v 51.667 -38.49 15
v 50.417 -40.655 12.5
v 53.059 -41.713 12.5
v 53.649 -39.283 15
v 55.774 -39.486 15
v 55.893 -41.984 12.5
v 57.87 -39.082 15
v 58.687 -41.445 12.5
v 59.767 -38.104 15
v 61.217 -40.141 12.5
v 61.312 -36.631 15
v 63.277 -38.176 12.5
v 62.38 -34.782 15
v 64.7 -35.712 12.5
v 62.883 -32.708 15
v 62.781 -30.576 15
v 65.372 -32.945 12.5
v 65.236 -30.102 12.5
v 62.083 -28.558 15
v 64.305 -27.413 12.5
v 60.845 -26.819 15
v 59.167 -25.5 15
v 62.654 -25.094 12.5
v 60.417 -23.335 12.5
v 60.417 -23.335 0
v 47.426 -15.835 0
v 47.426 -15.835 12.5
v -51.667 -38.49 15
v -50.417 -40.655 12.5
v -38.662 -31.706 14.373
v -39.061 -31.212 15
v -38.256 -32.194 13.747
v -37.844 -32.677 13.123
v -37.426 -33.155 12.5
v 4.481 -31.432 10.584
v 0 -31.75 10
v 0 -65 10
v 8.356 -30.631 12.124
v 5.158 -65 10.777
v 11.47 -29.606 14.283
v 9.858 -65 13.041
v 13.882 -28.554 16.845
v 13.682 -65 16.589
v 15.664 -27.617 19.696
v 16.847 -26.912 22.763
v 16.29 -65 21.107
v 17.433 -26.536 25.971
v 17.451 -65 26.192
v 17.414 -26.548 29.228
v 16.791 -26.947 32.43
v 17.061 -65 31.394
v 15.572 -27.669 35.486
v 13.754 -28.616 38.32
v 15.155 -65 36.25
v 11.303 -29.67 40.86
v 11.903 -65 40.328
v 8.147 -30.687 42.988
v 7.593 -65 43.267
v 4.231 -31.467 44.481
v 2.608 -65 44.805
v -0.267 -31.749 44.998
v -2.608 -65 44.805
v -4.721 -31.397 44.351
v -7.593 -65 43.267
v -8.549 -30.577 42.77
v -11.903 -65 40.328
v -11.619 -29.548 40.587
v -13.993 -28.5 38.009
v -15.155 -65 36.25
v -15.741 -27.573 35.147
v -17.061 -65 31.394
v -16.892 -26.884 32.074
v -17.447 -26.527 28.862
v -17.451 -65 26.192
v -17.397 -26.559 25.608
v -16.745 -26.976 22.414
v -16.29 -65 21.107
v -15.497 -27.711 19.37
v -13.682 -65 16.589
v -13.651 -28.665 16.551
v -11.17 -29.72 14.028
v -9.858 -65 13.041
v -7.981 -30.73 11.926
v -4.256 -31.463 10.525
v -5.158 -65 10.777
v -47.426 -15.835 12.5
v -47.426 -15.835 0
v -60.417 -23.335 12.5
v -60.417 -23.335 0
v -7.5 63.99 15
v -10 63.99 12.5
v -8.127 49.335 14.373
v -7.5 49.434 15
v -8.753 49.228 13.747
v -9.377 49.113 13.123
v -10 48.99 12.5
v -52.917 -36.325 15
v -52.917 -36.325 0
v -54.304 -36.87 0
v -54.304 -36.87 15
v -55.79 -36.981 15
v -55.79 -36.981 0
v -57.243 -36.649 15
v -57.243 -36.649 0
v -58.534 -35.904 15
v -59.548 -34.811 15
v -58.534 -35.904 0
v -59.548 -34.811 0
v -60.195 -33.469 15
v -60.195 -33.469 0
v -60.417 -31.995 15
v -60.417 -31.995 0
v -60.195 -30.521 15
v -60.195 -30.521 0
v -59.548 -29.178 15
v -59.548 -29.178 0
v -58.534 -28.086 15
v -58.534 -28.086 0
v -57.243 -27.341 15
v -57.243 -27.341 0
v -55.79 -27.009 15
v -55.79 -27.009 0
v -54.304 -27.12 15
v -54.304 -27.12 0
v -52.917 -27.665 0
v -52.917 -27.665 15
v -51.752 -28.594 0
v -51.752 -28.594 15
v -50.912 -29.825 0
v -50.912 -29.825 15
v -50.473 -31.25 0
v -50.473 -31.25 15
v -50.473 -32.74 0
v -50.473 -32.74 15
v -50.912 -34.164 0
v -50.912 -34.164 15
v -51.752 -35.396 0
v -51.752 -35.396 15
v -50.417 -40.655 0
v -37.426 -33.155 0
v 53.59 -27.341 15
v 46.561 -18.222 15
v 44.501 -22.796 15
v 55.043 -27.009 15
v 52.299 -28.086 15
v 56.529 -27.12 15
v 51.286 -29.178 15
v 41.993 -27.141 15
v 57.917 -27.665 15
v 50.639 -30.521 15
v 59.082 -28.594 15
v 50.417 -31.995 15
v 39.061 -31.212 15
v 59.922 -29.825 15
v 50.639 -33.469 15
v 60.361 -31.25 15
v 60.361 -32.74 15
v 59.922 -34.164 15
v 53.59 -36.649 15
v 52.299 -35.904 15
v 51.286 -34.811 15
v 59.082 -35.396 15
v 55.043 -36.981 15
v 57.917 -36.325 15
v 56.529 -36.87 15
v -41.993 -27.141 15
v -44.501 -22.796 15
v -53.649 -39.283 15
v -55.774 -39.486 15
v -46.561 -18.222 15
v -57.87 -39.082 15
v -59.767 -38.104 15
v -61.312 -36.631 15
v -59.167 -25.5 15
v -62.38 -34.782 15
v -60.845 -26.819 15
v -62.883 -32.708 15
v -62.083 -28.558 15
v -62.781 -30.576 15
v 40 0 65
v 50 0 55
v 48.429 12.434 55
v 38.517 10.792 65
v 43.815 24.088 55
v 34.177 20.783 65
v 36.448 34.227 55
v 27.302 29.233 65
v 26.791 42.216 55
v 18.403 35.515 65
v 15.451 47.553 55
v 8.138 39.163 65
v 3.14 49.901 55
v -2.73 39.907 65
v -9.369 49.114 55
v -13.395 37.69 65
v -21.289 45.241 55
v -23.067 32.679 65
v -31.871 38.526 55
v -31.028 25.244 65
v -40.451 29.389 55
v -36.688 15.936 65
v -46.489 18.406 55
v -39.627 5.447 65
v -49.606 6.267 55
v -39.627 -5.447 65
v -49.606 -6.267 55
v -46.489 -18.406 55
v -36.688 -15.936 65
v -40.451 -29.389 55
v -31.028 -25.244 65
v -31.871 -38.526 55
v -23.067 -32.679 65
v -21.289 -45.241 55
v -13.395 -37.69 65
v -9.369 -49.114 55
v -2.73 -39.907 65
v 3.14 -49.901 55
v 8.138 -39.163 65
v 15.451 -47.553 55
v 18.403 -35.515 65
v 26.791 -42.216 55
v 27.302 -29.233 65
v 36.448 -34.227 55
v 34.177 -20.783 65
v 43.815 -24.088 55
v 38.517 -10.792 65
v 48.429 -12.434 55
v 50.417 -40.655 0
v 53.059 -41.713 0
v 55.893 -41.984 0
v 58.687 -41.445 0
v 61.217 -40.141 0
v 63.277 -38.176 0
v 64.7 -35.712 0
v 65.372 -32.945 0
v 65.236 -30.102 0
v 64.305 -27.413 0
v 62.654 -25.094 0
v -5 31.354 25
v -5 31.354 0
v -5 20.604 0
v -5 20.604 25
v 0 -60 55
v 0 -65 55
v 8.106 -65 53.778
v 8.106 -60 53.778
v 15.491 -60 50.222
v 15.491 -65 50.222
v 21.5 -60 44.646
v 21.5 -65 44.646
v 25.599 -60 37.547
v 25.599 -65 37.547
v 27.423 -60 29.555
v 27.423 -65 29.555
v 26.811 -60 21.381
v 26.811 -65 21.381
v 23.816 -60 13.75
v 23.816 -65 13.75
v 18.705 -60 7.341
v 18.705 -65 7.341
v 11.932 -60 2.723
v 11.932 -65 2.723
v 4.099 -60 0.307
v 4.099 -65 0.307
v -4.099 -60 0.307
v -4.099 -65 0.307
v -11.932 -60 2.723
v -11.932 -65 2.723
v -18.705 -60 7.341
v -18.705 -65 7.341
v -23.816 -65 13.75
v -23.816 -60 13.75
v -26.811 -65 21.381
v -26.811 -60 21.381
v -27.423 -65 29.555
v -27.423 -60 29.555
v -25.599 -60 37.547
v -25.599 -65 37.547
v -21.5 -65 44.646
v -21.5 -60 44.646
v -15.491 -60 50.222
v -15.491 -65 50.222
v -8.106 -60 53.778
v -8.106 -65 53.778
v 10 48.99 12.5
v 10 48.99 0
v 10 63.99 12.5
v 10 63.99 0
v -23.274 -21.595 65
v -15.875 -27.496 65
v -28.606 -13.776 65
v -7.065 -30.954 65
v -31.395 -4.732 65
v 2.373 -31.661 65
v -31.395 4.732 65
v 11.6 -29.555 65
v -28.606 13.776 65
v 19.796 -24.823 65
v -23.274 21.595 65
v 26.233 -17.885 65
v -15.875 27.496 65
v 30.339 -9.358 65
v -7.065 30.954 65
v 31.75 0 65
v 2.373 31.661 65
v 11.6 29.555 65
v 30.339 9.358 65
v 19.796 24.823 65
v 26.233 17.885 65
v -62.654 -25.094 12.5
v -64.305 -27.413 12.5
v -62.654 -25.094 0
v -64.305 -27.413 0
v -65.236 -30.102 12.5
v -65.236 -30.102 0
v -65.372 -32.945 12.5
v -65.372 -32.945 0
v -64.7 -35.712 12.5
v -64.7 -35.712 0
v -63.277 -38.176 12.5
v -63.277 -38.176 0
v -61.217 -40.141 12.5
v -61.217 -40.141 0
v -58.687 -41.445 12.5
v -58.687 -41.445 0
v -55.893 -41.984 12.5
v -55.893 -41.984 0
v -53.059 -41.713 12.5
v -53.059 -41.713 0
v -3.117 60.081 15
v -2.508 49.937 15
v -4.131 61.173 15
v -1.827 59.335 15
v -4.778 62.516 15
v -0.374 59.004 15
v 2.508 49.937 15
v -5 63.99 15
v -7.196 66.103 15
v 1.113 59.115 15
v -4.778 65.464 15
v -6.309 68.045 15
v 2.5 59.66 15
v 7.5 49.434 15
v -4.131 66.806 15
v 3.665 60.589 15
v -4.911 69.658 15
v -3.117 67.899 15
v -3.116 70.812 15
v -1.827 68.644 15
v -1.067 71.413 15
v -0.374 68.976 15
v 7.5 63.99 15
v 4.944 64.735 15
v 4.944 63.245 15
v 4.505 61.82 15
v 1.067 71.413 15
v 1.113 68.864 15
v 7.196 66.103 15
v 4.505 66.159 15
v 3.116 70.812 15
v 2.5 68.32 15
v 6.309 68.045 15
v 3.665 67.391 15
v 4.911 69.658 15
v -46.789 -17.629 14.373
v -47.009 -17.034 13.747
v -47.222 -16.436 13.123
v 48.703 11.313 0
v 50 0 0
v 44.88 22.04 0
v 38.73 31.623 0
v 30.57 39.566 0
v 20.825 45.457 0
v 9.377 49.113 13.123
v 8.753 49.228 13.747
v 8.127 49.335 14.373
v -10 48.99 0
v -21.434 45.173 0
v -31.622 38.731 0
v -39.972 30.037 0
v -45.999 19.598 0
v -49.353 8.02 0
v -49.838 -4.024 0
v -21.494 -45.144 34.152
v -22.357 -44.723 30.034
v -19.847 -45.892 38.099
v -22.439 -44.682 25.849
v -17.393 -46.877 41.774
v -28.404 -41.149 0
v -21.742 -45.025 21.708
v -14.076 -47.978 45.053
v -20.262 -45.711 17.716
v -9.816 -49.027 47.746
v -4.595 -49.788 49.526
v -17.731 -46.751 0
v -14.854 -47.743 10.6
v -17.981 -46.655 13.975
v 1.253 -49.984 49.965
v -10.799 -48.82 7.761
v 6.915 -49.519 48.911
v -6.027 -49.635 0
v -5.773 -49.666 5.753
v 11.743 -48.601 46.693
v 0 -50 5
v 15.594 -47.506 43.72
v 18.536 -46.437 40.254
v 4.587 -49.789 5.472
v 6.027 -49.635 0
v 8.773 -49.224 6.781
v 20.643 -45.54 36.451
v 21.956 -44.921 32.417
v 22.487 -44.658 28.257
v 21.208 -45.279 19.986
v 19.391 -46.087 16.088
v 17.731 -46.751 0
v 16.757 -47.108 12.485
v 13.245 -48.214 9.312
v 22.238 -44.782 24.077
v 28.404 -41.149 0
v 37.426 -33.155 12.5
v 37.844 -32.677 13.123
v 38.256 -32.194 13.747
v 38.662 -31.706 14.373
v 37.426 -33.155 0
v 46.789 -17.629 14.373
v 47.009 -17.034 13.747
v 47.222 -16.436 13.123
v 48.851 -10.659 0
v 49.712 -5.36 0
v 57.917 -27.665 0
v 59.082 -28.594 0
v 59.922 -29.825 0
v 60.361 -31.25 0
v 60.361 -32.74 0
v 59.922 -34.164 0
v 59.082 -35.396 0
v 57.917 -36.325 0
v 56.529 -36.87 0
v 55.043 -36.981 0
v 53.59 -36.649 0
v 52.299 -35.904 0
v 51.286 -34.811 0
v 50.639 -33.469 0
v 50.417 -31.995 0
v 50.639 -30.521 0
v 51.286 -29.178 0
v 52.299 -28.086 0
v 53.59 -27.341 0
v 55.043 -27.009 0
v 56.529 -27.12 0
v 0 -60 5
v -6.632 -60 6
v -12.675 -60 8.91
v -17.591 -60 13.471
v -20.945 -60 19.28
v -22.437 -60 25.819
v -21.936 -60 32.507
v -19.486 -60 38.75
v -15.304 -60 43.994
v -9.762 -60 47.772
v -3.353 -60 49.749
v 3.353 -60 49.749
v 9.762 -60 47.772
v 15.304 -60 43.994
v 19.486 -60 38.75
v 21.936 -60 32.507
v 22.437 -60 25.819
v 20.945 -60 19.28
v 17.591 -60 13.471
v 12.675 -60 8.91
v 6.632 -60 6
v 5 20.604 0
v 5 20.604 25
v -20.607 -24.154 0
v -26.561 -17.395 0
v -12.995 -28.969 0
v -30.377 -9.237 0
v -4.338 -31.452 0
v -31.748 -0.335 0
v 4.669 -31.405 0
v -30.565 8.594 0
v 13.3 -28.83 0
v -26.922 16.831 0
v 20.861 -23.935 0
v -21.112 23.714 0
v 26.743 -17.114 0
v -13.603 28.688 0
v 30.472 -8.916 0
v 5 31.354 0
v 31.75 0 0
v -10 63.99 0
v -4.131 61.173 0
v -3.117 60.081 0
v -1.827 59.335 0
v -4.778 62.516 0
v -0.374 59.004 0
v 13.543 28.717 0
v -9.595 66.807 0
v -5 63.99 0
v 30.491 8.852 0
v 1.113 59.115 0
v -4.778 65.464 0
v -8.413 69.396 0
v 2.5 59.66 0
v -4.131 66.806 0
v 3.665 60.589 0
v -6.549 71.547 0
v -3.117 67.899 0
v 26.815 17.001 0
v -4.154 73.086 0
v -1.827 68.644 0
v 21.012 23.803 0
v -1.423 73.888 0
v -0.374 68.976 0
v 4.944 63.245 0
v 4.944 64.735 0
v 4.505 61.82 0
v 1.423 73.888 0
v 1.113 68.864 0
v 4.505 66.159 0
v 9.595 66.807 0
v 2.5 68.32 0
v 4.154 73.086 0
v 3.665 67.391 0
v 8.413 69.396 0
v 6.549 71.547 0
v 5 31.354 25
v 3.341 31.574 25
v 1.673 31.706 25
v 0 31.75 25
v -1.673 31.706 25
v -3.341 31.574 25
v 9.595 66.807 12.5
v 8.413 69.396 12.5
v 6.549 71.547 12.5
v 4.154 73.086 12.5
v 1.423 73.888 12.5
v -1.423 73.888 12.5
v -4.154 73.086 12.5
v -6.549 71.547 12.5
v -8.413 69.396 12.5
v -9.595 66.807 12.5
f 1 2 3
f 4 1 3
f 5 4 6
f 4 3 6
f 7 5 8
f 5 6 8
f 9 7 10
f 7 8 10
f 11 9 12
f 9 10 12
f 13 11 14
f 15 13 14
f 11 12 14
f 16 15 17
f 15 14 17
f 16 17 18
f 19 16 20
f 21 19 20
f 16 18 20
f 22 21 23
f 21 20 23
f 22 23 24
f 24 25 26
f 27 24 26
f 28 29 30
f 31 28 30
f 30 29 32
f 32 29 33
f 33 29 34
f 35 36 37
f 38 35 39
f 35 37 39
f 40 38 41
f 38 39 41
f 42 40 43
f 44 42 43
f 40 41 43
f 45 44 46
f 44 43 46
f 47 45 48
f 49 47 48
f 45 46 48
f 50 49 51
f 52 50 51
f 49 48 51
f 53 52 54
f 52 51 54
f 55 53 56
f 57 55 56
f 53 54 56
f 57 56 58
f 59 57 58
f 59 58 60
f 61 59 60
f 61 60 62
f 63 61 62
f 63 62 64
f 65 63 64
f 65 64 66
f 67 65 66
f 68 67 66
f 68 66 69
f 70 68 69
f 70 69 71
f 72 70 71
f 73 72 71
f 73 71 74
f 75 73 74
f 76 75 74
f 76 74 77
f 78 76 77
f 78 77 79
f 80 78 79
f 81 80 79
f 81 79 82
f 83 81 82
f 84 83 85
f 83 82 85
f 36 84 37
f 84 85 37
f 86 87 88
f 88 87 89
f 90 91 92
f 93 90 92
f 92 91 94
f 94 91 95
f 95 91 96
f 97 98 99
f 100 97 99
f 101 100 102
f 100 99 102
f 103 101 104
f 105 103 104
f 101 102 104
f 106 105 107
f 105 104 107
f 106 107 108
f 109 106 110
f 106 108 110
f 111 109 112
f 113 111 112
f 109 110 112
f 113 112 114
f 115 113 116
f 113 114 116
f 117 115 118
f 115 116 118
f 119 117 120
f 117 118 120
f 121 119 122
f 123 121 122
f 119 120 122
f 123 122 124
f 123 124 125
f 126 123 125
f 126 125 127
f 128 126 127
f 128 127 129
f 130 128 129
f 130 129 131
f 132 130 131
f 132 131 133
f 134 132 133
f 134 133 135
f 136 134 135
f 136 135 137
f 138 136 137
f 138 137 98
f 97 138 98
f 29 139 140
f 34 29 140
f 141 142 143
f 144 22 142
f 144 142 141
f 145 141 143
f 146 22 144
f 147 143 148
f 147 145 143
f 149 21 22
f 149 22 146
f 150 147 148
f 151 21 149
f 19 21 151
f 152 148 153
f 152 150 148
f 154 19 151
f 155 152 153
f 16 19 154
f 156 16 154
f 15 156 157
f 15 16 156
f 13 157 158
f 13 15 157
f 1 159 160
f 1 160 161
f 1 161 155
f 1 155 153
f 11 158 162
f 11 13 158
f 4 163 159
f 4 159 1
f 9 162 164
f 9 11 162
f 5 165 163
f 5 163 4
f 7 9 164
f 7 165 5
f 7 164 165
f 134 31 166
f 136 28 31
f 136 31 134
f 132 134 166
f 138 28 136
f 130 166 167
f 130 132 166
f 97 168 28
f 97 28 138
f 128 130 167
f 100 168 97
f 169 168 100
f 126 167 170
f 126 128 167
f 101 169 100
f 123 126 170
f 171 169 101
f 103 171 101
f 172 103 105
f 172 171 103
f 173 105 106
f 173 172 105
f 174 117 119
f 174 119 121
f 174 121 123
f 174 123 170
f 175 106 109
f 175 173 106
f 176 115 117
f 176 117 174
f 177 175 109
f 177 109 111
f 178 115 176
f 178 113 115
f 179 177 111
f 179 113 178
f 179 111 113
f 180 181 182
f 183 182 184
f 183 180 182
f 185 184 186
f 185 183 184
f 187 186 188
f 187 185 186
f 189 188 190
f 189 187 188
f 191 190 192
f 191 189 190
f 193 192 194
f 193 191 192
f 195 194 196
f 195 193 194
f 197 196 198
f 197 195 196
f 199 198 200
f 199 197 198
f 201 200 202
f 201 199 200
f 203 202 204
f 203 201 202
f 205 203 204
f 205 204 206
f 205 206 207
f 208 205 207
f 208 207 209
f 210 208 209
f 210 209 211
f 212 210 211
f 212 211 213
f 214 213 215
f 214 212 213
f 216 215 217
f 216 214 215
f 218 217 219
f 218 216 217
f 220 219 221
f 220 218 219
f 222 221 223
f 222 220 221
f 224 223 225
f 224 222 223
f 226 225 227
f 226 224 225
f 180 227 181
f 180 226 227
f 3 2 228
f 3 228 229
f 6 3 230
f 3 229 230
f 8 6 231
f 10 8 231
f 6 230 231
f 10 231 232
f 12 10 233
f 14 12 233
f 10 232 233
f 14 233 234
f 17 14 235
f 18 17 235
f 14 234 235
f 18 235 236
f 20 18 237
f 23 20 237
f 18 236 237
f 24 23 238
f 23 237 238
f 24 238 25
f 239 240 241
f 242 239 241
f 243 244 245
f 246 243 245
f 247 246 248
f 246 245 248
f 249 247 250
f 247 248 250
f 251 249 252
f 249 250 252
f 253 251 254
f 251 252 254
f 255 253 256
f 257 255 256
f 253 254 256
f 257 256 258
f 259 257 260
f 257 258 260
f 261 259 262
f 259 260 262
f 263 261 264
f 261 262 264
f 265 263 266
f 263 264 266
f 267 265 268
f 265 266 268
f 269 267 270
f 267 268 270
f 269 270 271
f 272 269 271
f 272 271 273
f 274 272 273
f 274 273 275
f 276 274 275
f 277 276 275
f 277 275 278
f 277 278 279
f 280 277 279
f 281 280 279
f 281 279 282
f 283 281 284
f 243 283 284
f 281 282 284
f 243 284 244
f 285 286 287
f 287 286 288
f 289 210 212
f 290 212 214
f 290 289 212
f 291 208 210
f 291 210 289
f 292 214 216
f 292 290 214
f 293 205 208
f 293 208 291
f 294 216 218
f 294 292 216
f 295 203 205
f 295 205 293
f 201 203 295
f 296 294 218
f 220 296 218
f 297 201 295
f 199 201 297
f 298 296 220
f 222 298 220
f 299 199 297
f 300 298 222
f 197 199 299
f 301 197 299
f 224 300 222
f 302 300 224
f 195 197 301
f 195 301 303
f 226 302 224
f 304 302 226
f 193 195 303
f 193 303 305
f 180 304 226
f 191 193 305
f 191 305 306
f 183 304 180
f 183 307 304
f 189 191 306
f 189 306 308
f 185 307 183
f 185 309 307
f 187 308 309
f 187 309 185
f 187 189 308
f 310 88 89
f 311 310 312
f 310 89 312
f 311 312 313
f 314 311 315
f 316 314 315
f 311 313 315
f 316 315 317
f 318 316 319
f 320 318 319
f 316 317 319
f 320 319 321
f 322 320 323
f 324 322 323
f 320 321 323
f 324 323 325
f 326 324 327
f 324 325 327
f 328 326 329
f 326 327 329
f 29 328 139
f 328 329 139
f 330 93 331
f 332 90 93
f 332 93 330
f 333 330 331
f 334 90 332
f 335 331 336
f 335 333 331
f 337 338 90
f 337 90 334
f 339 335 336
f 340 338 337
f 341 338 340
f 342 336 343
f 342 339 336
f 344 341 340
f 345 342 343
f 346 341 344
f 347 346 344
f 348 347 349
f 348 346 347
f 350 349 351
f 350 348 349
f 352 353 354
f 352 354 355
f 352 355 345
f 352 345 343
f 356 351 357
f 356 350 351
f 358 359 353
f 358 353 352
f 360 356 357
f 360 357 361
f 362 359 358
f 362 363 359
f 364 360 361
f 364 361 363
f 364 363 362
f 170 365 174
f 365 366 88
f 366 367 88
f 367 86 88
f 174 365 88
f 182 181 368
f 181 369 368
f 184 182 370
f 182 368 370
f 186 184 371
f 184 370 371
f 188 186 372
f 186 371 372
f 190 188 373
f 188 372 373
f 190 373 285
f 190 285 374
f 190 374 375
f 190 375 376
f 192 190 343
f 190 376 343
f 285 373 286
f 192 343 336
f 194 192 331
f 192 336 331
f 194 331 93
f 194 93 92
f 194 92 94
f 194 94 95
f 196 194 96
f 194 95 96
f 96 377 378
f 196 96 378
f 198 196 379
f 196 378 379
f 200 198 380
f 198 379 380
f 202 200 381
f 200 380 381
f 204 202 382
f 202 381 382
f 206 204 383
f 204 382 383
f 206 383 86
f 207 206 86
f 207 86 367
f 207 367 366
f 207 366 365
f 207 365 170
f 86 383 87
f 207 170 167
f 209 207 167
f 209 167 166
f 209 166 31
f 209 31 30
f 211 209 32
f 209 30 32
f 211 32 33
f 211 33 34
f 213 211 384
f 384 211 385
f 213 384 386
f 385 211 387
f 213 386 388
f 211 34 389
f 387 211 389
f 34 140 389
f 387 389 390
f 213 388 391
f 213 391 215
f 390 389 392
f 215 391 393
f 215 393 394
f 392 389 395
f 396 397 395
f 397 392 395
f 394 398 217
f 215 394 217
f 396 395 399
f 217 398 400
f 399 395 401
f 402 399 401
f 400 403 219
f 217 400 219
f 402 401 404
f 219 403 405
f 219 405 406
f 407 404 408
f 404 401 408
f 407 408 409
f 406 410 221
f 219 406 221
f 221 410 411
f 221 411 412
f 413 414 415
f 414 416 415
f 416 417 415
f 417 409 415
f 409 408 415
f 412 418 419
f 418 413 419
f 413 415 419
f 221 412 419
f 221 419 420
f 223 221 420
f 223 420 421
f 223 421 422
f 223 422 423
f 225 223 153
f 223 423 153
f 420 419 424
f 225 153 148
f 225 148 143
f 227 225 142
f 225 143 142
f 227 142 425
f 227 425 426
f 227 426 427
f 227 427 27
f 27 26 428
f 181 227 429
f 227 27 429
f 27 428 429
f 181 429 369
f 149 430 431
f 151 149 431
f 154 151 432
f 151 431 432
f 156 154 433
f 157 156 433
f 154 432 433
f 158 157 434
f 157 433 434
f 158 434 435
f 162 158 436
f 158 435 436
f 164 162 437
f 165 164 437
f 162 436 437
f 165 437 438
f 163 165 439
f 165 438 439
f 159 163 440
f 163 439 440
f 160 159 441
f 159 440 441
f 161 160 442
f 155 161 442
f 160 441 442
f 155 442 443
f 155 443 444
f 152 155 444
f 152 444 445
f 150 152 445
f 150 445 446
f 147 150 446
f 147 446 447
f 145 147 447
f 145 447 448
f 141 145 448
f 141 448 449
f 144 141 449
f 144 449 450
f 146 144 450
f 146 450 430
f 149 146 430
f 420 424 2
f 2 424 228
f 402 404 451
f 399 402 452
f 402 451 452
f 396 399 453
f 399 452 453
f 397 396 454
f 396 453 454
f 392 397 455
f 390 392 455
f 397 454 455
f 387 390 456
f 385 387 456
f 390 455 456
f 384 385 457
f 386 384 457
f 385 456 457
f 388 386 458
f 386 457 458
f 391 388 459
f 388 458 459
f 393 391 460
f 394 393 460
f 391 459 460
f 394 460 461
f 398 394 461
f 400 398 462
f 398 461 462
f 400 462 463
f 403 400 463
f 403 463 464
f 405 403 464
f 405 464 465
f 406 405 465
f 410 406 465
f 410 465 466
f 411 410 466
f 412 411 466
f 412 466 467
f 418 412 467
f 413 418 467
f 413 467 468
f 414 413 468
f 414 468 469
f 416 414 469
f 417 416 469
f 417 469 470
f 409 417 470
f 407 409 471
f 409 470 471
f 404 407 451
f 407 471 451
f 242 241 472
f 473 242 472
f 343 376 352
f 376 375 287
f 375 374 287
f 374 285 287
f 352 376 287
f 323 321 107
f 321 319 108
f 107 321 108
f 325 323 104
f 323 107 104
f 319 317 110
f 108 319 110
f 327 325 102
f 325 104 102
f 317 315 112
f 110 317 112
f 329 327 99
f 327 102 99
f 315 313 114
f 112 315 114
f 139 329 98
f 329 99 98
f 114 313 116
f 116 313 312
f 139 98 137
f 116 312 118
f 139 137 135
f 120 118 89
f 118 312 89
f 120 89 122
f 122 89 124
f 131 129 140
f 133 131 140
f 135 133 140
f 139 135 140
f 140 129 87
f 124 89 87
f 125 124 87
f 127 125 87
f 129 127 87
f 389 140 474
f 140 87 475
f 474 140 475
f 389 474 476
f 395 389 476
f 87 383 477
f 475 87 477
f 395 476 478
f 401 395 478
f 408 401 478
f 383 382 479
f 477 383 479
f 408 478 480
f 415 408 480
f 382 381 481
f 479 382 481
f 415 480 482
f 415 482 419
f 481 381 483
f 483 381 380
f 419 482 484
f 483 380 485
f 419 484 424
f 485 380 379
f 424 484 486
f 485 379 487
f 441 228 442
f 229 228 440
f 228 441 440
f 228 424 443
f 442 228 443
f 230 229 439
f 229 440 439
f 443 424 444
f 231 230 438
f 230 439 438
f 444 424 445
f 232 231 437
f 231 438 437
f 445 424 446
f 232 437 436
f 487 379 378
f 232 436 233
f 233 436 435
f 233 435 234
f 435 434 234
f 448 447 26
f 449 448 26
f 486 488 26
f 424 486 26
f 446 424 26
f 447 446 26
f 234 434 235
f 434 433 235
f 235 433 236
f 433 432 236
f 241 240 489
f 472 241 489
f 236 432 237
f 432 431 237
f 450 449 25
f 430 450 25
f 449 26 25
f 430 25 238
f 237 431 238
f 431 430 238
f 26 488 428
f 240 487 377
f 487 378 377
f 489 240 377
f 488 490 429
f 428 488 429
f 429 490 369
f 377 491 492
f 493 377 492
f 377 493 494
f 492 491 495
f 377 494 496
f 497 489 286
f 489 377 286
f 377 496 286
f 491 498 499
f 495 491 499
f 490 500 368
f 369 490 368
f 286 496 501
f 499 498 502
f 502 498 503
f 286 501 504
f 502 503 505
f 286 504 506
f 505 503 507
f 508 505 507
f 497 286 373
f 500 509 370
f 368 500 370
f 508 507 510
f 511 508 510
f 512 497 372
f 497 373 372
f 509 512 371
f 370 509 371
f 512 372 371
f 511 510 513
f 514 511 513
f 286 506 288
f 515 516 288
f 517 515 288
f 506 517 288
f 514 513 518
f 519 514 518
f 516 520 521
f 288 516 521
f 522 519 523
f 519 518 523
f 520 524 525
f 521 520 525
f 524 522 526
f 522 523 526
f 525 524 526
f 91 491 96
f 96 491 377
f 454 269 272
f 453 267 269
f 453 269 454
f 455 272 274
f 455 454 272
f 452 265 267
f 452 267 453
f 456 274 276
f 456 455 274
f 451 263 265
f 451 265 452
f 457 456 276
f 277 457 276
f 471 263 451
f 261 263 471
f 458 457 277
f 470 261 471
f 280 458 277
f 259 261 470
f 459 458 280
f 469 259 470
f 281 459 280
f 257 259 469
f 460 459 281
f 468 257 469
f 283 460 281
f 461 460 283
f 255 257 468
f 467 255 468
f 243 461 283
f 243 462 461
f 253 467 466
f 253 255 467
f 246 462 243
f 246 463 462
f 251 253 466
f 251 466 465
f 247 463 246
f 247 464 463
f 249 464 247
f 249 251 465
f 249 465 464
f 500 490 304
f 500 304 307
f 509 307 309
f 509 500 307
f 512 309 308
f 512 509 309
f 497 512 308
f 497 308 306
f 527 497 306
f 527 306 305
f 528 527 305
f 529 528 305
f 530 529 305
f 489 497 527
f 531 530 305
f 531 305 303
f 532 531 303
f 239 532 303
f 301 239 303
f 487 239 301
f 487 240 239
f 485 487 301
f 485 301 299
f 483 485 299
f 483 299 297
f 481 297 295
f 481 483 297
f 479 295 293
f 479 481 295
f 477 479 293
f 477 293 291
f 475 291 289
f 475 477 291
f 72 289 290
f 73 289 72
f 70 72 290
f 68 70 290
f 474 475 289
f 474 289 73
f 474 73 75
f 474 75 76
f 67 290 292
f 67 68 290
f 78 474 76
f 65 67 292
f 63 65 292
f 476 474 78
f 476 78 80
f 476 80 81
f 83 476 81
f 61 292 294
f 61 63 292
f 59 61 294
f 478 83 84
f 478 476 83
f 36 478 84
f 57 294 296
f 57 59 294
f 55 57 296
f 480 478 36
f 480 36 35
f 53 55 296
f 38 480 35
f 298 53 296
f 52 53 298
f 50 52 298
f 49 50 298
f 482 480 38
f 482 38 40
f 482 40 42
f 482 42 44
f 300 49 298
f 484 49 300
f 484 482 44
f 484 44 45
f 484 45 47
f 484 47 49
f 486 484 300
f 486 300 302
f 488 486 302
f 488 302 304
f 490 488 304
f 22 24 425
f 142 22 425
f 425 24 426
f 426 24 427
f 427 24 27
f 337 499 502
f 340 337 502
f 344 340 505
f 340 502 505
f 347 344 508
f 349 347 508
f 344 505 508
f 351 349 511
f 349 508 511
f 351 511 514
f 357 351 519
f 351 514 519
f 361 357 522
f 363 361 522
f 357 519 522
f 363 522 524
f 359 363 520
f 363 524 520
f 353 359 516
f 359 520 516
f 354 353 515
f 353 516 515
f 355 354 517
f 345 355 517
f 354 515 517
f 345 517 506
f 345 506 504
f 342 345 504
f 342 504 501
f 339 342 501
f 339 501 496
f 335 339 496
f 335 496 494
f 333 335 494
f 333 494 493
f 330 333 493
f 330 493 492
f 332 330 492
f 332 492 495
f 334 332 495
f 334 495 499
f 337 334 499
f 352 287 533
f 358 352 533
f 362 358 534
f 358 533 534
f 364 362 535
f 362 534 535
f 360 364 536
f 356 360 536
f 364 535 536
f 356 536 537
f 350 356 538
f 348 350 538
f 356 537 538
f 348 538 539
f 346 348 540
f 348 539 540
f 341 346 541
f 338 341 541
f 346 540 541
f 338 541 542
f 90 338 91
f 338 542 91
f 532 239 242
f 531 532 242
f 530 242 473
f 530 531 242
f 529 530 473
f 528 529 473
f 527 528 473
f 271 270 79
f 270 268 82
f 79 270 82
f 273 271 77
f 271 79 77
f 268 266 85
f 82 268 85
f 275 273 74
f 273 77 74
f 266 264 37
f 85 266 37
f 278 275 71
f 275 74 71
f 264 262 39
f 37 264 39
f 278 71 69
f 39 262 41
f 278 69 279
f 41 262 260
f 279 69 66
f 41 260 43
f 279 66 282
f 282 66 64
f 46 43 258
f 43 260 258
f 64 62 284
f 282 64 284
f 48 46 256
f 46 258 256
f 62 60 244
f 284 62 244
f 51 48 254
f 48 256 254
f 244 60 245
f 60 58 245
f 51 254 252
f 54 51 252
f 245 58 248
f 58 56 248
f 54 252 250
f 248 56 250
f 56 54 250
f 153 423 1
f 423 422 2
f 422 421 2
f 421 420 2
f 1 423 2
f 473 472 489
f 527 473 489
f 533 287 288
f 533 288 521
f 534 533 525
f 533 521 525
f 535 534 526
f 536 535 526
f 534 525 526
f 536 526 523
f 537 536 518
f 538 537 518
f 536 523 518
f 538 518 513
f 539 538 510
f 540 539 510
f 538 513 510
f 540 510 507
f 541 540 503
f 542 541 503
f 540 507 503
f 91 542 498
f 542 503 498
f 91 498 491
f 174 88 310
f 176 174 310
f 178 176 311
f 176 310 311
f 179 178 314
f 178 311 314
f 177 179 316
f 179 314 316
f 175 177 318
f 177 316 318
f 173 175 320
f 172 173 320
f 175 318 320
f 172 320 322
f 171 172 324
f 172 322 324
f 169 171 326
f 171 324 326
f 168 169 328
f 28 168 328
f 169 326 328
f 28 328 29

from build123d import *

# Parameters (mm, degrees)
SKETCH1_R                    = 50
SKETCH1_R_2                  = 31.75
BOSS_EXTRUDE1_DEPTH          = 65
BOSS_EXTRUDE2_DEPTH          = 25
BOSS_EXTRUDE3_DEPTH          = 15
CHAMFER2_SIZE                = 2.5
F_10_0MM_DOWEL_HOLE1_D       = 10
CIRPATTERN2_COUNT            = 3
CHAMFER2_OF_CIRPATTERN2_SIZE = 2.5
CHAMFER1_SIZE                = 10
SKETCH2_R                    = 27.5
BOSS_EXTRUDE4_DEPTH          = 5
BOSS_EXTRUDE5_REACH          = 164.658
BOSS_EXTRUDE5_END_RADIUS     = 50
SKETCH3_R                    = 22.5
CUT_EXTRUDE1_REACH           = 168.801
CUT_EXTRUDE1_END_RADIUS      = 31.75
SKETCH4_R                    = 17.5


with BuildPart() as part:
    # Sketch1 → Boss-Extrude1 (new body)
    with BuildSketch(Plane.XY):
        Circle(SKETCH1_R)
        Circle(SKETCH1_R_2, mode=Mode.SUBTRACT)
    extrude(amount=BOSS_EXTRUDE1_DEPTH)

    # Sketch1<3> → Boss-Extrude2 (add)
    with BuildSketch(Plane.XY):
        with BuildLine():
            Line((-5, 20.603827518), (0, 20.603827518))
            Line((0, 20.603827518), (0, 31.75))
            ThreePointArc((0, 31.75), (-2.507835353, 31.650801915), (-5, 31.353827518))
            Line((-5, 31.353827518), (-5, 20.603827518))
        make_face()
        with BuildLine():
            Line((0, 31.75), (0, 20.603827518))
            Line((0, 20.603827518), (5, 20.603827518))
            Line((5, 20.603827518), (5, 31.353827518))
            ThreePointArc((5, 31.353827518), (2.507835353, 31.650801915), (0, 31.75))
        make_face()
    extrude(amount=BOSS_EXTRUDE2_DEPTH)

    # Sketch1<4> → Boss-Extrude3 (add)
    with BuildSketch(Plane.XY):
        with BuildLine():
            Line((-10, 63.989794856), (-10, 48.989794856))
            ThreePointArc((-10, 48.989794856), (0, 50), (10, 48.989794856))
            Line((10, 48.989794856), (10, 63.989794856))
            ThreePointArc((10, 63.989794856), (0, 73.989794856), (-10, 63.989794856))
        make_face()
    boss_extrude3 = extrude(amount=BOSS_EXTRUDE3_DEPTH)

    # Chamfer2
    chamfer2_edges = [part.edges().sort_by_distance(p)[0] for p in [
        (0, 73.989794856, 15),
        (-10, 56.489794856, 15),
        (10, 56.489794856, 15),
    ]]
    chamfer(chamfer2_edges, length=CHAMFER2_SIZE)

    # Ø10.0mm Dowel Hole1 (through all)
    with Locations(Plane.XY.offset(15)):
        with Locations((0, 63.989794856)):
            f_10_0mm_dowel_hole1 = Hole(F_10_0MM_DOWEL_HOLE1_D / 2)

    # CirPattern2: Boss-Extrude3, Ø10.0mm Dowel Hole1 ×3 about axis
    cirpattern2_axis = Axis((0, 0, 0), (0, 0, 1))
    add([boss_extrude3.rotate(cirpattern2_axis, i * 360 / CIRPATTERN2_COUNT) for i in range(1, CIRPATTERN2_COUNT)])
    add([f_10_0mm_dowel_hole1.rotate(cirpattern2_axis, i * 360 / CIRPATTERN2_COUNT) for i in range(1, CIRPATTERN2_COUNT)], mode=Mode.SUBTRACT)

    # Chamfer2 of CirPattern2
    chamfer2_of_cirpattern2_edges = [part.edges().sort_by_distance(p)[0] for p in [
        (-64.077041966, -36.994897428, 15),
        (-43.9215974, -36.905151466, 15),
        (-53.9215974, -19.58464339, 15),
        (64.077041966, -36.994897428, 15),
        (53.9215974, -19.58464339, 15),
        (43.9215974, -36.905151466, 15),
    ]]
    chamfer(chamfer2_of_cirpattern2_edges, length=CHAMFER2_OF_CIRPATTERN2_SIZE)

    # Chamfer1
    chamfer1_edges = [part.edges().sort_by_distance(p)[0] for p in [
        (-50, 0, 65),
    ]]
    chamfer(chamfer1_edges, length=CHAMFER1_SIZE)



with BuildPart() as body_2:
    # Sketch2 → Boss-Extrude4 (new body)
    with BuildSketch(Plane(origin=(0, -65, 0), x_dir=(1, 0, 0), z_dir=(0, 1, 0))):
        with Locations(Location((0, -27.5, 0), (0, 0, 270))):
            Circle(SKETCH2_R)
    extrude(amount=BOSS_EXTRUDE4_DEPTH)


with BuildPart() as part_1:
    add(part.part)

    add(body_2.part)  # Boss-Extrude5 merges body 2
    # Boss-Extrude5: up to this cylinder (the profile starts outside it)
    boss_extrude5_end = Plane(origin=(0, 0, 27.5), z_dir=(0, 0, -1)) * Cylinder(BOSS_EXTRUDE5_END_RADIUS, 430.316, mode=Mode.PRIVATE)
    # Sketch3 → Boss-Extrude5 (add, up to the surface)
    with BuildSketch(Plane(origin=(0, -60, 0), x_dir=(1, 0, 0), z_dir=(0, 1, 0)), mode=Mode.PRIVATE) as boss_extrude5_sk1:
        with Locations(Location((0, -27.5, 0), (0, 0, 90))):
            Circle(SKETCH3_R)
    boss_extrude5_tool1 = extrude(boss_extrude5_sk1.sketch, amount=BOSS_EXTRUDE5_REACH, mode=Mode.PRIVATE) - boss_extrude5_end
    add(boss_extrude5_tool1.solids().sort_by_distance((0, -60, 27.5))[0])

    # Cut-Extrude1: up to this cylinder (the profile starts outside it)
    cut_extrude1_end = Plane(origin=(0, 0, 27.5), z_dir=(0, 0, -1)) * Cylinder(CUT_EXTRUDE1_END_RADIUS, 402.102, mode=Mode.PRIVATE)
    # Sketch4 → Cut-Extrude1 (cut, up to the surface)
    with BuildSketch(Plane.XZ.offset(65), mode=Mode.PRIVATE) as cut_extrude1_sk1:
        with Locations(Location((0, 27.5, 0), (0, 0, 270))):
            Circle(SKETCH4_R)
    cut_extrude1_tool1 = extrude(cut_extrude1_sk1.sketch, amount=-CUT_EXTRUDE1_REACH, mode=Mode.PRIVATE) - cut_extrude1_end
    add(cut_extrude1_tool1.solids().sort_by_distance((0, -65, 27.5))[0], mode=Mode.SUBTRACT)


solid = part_1.part
